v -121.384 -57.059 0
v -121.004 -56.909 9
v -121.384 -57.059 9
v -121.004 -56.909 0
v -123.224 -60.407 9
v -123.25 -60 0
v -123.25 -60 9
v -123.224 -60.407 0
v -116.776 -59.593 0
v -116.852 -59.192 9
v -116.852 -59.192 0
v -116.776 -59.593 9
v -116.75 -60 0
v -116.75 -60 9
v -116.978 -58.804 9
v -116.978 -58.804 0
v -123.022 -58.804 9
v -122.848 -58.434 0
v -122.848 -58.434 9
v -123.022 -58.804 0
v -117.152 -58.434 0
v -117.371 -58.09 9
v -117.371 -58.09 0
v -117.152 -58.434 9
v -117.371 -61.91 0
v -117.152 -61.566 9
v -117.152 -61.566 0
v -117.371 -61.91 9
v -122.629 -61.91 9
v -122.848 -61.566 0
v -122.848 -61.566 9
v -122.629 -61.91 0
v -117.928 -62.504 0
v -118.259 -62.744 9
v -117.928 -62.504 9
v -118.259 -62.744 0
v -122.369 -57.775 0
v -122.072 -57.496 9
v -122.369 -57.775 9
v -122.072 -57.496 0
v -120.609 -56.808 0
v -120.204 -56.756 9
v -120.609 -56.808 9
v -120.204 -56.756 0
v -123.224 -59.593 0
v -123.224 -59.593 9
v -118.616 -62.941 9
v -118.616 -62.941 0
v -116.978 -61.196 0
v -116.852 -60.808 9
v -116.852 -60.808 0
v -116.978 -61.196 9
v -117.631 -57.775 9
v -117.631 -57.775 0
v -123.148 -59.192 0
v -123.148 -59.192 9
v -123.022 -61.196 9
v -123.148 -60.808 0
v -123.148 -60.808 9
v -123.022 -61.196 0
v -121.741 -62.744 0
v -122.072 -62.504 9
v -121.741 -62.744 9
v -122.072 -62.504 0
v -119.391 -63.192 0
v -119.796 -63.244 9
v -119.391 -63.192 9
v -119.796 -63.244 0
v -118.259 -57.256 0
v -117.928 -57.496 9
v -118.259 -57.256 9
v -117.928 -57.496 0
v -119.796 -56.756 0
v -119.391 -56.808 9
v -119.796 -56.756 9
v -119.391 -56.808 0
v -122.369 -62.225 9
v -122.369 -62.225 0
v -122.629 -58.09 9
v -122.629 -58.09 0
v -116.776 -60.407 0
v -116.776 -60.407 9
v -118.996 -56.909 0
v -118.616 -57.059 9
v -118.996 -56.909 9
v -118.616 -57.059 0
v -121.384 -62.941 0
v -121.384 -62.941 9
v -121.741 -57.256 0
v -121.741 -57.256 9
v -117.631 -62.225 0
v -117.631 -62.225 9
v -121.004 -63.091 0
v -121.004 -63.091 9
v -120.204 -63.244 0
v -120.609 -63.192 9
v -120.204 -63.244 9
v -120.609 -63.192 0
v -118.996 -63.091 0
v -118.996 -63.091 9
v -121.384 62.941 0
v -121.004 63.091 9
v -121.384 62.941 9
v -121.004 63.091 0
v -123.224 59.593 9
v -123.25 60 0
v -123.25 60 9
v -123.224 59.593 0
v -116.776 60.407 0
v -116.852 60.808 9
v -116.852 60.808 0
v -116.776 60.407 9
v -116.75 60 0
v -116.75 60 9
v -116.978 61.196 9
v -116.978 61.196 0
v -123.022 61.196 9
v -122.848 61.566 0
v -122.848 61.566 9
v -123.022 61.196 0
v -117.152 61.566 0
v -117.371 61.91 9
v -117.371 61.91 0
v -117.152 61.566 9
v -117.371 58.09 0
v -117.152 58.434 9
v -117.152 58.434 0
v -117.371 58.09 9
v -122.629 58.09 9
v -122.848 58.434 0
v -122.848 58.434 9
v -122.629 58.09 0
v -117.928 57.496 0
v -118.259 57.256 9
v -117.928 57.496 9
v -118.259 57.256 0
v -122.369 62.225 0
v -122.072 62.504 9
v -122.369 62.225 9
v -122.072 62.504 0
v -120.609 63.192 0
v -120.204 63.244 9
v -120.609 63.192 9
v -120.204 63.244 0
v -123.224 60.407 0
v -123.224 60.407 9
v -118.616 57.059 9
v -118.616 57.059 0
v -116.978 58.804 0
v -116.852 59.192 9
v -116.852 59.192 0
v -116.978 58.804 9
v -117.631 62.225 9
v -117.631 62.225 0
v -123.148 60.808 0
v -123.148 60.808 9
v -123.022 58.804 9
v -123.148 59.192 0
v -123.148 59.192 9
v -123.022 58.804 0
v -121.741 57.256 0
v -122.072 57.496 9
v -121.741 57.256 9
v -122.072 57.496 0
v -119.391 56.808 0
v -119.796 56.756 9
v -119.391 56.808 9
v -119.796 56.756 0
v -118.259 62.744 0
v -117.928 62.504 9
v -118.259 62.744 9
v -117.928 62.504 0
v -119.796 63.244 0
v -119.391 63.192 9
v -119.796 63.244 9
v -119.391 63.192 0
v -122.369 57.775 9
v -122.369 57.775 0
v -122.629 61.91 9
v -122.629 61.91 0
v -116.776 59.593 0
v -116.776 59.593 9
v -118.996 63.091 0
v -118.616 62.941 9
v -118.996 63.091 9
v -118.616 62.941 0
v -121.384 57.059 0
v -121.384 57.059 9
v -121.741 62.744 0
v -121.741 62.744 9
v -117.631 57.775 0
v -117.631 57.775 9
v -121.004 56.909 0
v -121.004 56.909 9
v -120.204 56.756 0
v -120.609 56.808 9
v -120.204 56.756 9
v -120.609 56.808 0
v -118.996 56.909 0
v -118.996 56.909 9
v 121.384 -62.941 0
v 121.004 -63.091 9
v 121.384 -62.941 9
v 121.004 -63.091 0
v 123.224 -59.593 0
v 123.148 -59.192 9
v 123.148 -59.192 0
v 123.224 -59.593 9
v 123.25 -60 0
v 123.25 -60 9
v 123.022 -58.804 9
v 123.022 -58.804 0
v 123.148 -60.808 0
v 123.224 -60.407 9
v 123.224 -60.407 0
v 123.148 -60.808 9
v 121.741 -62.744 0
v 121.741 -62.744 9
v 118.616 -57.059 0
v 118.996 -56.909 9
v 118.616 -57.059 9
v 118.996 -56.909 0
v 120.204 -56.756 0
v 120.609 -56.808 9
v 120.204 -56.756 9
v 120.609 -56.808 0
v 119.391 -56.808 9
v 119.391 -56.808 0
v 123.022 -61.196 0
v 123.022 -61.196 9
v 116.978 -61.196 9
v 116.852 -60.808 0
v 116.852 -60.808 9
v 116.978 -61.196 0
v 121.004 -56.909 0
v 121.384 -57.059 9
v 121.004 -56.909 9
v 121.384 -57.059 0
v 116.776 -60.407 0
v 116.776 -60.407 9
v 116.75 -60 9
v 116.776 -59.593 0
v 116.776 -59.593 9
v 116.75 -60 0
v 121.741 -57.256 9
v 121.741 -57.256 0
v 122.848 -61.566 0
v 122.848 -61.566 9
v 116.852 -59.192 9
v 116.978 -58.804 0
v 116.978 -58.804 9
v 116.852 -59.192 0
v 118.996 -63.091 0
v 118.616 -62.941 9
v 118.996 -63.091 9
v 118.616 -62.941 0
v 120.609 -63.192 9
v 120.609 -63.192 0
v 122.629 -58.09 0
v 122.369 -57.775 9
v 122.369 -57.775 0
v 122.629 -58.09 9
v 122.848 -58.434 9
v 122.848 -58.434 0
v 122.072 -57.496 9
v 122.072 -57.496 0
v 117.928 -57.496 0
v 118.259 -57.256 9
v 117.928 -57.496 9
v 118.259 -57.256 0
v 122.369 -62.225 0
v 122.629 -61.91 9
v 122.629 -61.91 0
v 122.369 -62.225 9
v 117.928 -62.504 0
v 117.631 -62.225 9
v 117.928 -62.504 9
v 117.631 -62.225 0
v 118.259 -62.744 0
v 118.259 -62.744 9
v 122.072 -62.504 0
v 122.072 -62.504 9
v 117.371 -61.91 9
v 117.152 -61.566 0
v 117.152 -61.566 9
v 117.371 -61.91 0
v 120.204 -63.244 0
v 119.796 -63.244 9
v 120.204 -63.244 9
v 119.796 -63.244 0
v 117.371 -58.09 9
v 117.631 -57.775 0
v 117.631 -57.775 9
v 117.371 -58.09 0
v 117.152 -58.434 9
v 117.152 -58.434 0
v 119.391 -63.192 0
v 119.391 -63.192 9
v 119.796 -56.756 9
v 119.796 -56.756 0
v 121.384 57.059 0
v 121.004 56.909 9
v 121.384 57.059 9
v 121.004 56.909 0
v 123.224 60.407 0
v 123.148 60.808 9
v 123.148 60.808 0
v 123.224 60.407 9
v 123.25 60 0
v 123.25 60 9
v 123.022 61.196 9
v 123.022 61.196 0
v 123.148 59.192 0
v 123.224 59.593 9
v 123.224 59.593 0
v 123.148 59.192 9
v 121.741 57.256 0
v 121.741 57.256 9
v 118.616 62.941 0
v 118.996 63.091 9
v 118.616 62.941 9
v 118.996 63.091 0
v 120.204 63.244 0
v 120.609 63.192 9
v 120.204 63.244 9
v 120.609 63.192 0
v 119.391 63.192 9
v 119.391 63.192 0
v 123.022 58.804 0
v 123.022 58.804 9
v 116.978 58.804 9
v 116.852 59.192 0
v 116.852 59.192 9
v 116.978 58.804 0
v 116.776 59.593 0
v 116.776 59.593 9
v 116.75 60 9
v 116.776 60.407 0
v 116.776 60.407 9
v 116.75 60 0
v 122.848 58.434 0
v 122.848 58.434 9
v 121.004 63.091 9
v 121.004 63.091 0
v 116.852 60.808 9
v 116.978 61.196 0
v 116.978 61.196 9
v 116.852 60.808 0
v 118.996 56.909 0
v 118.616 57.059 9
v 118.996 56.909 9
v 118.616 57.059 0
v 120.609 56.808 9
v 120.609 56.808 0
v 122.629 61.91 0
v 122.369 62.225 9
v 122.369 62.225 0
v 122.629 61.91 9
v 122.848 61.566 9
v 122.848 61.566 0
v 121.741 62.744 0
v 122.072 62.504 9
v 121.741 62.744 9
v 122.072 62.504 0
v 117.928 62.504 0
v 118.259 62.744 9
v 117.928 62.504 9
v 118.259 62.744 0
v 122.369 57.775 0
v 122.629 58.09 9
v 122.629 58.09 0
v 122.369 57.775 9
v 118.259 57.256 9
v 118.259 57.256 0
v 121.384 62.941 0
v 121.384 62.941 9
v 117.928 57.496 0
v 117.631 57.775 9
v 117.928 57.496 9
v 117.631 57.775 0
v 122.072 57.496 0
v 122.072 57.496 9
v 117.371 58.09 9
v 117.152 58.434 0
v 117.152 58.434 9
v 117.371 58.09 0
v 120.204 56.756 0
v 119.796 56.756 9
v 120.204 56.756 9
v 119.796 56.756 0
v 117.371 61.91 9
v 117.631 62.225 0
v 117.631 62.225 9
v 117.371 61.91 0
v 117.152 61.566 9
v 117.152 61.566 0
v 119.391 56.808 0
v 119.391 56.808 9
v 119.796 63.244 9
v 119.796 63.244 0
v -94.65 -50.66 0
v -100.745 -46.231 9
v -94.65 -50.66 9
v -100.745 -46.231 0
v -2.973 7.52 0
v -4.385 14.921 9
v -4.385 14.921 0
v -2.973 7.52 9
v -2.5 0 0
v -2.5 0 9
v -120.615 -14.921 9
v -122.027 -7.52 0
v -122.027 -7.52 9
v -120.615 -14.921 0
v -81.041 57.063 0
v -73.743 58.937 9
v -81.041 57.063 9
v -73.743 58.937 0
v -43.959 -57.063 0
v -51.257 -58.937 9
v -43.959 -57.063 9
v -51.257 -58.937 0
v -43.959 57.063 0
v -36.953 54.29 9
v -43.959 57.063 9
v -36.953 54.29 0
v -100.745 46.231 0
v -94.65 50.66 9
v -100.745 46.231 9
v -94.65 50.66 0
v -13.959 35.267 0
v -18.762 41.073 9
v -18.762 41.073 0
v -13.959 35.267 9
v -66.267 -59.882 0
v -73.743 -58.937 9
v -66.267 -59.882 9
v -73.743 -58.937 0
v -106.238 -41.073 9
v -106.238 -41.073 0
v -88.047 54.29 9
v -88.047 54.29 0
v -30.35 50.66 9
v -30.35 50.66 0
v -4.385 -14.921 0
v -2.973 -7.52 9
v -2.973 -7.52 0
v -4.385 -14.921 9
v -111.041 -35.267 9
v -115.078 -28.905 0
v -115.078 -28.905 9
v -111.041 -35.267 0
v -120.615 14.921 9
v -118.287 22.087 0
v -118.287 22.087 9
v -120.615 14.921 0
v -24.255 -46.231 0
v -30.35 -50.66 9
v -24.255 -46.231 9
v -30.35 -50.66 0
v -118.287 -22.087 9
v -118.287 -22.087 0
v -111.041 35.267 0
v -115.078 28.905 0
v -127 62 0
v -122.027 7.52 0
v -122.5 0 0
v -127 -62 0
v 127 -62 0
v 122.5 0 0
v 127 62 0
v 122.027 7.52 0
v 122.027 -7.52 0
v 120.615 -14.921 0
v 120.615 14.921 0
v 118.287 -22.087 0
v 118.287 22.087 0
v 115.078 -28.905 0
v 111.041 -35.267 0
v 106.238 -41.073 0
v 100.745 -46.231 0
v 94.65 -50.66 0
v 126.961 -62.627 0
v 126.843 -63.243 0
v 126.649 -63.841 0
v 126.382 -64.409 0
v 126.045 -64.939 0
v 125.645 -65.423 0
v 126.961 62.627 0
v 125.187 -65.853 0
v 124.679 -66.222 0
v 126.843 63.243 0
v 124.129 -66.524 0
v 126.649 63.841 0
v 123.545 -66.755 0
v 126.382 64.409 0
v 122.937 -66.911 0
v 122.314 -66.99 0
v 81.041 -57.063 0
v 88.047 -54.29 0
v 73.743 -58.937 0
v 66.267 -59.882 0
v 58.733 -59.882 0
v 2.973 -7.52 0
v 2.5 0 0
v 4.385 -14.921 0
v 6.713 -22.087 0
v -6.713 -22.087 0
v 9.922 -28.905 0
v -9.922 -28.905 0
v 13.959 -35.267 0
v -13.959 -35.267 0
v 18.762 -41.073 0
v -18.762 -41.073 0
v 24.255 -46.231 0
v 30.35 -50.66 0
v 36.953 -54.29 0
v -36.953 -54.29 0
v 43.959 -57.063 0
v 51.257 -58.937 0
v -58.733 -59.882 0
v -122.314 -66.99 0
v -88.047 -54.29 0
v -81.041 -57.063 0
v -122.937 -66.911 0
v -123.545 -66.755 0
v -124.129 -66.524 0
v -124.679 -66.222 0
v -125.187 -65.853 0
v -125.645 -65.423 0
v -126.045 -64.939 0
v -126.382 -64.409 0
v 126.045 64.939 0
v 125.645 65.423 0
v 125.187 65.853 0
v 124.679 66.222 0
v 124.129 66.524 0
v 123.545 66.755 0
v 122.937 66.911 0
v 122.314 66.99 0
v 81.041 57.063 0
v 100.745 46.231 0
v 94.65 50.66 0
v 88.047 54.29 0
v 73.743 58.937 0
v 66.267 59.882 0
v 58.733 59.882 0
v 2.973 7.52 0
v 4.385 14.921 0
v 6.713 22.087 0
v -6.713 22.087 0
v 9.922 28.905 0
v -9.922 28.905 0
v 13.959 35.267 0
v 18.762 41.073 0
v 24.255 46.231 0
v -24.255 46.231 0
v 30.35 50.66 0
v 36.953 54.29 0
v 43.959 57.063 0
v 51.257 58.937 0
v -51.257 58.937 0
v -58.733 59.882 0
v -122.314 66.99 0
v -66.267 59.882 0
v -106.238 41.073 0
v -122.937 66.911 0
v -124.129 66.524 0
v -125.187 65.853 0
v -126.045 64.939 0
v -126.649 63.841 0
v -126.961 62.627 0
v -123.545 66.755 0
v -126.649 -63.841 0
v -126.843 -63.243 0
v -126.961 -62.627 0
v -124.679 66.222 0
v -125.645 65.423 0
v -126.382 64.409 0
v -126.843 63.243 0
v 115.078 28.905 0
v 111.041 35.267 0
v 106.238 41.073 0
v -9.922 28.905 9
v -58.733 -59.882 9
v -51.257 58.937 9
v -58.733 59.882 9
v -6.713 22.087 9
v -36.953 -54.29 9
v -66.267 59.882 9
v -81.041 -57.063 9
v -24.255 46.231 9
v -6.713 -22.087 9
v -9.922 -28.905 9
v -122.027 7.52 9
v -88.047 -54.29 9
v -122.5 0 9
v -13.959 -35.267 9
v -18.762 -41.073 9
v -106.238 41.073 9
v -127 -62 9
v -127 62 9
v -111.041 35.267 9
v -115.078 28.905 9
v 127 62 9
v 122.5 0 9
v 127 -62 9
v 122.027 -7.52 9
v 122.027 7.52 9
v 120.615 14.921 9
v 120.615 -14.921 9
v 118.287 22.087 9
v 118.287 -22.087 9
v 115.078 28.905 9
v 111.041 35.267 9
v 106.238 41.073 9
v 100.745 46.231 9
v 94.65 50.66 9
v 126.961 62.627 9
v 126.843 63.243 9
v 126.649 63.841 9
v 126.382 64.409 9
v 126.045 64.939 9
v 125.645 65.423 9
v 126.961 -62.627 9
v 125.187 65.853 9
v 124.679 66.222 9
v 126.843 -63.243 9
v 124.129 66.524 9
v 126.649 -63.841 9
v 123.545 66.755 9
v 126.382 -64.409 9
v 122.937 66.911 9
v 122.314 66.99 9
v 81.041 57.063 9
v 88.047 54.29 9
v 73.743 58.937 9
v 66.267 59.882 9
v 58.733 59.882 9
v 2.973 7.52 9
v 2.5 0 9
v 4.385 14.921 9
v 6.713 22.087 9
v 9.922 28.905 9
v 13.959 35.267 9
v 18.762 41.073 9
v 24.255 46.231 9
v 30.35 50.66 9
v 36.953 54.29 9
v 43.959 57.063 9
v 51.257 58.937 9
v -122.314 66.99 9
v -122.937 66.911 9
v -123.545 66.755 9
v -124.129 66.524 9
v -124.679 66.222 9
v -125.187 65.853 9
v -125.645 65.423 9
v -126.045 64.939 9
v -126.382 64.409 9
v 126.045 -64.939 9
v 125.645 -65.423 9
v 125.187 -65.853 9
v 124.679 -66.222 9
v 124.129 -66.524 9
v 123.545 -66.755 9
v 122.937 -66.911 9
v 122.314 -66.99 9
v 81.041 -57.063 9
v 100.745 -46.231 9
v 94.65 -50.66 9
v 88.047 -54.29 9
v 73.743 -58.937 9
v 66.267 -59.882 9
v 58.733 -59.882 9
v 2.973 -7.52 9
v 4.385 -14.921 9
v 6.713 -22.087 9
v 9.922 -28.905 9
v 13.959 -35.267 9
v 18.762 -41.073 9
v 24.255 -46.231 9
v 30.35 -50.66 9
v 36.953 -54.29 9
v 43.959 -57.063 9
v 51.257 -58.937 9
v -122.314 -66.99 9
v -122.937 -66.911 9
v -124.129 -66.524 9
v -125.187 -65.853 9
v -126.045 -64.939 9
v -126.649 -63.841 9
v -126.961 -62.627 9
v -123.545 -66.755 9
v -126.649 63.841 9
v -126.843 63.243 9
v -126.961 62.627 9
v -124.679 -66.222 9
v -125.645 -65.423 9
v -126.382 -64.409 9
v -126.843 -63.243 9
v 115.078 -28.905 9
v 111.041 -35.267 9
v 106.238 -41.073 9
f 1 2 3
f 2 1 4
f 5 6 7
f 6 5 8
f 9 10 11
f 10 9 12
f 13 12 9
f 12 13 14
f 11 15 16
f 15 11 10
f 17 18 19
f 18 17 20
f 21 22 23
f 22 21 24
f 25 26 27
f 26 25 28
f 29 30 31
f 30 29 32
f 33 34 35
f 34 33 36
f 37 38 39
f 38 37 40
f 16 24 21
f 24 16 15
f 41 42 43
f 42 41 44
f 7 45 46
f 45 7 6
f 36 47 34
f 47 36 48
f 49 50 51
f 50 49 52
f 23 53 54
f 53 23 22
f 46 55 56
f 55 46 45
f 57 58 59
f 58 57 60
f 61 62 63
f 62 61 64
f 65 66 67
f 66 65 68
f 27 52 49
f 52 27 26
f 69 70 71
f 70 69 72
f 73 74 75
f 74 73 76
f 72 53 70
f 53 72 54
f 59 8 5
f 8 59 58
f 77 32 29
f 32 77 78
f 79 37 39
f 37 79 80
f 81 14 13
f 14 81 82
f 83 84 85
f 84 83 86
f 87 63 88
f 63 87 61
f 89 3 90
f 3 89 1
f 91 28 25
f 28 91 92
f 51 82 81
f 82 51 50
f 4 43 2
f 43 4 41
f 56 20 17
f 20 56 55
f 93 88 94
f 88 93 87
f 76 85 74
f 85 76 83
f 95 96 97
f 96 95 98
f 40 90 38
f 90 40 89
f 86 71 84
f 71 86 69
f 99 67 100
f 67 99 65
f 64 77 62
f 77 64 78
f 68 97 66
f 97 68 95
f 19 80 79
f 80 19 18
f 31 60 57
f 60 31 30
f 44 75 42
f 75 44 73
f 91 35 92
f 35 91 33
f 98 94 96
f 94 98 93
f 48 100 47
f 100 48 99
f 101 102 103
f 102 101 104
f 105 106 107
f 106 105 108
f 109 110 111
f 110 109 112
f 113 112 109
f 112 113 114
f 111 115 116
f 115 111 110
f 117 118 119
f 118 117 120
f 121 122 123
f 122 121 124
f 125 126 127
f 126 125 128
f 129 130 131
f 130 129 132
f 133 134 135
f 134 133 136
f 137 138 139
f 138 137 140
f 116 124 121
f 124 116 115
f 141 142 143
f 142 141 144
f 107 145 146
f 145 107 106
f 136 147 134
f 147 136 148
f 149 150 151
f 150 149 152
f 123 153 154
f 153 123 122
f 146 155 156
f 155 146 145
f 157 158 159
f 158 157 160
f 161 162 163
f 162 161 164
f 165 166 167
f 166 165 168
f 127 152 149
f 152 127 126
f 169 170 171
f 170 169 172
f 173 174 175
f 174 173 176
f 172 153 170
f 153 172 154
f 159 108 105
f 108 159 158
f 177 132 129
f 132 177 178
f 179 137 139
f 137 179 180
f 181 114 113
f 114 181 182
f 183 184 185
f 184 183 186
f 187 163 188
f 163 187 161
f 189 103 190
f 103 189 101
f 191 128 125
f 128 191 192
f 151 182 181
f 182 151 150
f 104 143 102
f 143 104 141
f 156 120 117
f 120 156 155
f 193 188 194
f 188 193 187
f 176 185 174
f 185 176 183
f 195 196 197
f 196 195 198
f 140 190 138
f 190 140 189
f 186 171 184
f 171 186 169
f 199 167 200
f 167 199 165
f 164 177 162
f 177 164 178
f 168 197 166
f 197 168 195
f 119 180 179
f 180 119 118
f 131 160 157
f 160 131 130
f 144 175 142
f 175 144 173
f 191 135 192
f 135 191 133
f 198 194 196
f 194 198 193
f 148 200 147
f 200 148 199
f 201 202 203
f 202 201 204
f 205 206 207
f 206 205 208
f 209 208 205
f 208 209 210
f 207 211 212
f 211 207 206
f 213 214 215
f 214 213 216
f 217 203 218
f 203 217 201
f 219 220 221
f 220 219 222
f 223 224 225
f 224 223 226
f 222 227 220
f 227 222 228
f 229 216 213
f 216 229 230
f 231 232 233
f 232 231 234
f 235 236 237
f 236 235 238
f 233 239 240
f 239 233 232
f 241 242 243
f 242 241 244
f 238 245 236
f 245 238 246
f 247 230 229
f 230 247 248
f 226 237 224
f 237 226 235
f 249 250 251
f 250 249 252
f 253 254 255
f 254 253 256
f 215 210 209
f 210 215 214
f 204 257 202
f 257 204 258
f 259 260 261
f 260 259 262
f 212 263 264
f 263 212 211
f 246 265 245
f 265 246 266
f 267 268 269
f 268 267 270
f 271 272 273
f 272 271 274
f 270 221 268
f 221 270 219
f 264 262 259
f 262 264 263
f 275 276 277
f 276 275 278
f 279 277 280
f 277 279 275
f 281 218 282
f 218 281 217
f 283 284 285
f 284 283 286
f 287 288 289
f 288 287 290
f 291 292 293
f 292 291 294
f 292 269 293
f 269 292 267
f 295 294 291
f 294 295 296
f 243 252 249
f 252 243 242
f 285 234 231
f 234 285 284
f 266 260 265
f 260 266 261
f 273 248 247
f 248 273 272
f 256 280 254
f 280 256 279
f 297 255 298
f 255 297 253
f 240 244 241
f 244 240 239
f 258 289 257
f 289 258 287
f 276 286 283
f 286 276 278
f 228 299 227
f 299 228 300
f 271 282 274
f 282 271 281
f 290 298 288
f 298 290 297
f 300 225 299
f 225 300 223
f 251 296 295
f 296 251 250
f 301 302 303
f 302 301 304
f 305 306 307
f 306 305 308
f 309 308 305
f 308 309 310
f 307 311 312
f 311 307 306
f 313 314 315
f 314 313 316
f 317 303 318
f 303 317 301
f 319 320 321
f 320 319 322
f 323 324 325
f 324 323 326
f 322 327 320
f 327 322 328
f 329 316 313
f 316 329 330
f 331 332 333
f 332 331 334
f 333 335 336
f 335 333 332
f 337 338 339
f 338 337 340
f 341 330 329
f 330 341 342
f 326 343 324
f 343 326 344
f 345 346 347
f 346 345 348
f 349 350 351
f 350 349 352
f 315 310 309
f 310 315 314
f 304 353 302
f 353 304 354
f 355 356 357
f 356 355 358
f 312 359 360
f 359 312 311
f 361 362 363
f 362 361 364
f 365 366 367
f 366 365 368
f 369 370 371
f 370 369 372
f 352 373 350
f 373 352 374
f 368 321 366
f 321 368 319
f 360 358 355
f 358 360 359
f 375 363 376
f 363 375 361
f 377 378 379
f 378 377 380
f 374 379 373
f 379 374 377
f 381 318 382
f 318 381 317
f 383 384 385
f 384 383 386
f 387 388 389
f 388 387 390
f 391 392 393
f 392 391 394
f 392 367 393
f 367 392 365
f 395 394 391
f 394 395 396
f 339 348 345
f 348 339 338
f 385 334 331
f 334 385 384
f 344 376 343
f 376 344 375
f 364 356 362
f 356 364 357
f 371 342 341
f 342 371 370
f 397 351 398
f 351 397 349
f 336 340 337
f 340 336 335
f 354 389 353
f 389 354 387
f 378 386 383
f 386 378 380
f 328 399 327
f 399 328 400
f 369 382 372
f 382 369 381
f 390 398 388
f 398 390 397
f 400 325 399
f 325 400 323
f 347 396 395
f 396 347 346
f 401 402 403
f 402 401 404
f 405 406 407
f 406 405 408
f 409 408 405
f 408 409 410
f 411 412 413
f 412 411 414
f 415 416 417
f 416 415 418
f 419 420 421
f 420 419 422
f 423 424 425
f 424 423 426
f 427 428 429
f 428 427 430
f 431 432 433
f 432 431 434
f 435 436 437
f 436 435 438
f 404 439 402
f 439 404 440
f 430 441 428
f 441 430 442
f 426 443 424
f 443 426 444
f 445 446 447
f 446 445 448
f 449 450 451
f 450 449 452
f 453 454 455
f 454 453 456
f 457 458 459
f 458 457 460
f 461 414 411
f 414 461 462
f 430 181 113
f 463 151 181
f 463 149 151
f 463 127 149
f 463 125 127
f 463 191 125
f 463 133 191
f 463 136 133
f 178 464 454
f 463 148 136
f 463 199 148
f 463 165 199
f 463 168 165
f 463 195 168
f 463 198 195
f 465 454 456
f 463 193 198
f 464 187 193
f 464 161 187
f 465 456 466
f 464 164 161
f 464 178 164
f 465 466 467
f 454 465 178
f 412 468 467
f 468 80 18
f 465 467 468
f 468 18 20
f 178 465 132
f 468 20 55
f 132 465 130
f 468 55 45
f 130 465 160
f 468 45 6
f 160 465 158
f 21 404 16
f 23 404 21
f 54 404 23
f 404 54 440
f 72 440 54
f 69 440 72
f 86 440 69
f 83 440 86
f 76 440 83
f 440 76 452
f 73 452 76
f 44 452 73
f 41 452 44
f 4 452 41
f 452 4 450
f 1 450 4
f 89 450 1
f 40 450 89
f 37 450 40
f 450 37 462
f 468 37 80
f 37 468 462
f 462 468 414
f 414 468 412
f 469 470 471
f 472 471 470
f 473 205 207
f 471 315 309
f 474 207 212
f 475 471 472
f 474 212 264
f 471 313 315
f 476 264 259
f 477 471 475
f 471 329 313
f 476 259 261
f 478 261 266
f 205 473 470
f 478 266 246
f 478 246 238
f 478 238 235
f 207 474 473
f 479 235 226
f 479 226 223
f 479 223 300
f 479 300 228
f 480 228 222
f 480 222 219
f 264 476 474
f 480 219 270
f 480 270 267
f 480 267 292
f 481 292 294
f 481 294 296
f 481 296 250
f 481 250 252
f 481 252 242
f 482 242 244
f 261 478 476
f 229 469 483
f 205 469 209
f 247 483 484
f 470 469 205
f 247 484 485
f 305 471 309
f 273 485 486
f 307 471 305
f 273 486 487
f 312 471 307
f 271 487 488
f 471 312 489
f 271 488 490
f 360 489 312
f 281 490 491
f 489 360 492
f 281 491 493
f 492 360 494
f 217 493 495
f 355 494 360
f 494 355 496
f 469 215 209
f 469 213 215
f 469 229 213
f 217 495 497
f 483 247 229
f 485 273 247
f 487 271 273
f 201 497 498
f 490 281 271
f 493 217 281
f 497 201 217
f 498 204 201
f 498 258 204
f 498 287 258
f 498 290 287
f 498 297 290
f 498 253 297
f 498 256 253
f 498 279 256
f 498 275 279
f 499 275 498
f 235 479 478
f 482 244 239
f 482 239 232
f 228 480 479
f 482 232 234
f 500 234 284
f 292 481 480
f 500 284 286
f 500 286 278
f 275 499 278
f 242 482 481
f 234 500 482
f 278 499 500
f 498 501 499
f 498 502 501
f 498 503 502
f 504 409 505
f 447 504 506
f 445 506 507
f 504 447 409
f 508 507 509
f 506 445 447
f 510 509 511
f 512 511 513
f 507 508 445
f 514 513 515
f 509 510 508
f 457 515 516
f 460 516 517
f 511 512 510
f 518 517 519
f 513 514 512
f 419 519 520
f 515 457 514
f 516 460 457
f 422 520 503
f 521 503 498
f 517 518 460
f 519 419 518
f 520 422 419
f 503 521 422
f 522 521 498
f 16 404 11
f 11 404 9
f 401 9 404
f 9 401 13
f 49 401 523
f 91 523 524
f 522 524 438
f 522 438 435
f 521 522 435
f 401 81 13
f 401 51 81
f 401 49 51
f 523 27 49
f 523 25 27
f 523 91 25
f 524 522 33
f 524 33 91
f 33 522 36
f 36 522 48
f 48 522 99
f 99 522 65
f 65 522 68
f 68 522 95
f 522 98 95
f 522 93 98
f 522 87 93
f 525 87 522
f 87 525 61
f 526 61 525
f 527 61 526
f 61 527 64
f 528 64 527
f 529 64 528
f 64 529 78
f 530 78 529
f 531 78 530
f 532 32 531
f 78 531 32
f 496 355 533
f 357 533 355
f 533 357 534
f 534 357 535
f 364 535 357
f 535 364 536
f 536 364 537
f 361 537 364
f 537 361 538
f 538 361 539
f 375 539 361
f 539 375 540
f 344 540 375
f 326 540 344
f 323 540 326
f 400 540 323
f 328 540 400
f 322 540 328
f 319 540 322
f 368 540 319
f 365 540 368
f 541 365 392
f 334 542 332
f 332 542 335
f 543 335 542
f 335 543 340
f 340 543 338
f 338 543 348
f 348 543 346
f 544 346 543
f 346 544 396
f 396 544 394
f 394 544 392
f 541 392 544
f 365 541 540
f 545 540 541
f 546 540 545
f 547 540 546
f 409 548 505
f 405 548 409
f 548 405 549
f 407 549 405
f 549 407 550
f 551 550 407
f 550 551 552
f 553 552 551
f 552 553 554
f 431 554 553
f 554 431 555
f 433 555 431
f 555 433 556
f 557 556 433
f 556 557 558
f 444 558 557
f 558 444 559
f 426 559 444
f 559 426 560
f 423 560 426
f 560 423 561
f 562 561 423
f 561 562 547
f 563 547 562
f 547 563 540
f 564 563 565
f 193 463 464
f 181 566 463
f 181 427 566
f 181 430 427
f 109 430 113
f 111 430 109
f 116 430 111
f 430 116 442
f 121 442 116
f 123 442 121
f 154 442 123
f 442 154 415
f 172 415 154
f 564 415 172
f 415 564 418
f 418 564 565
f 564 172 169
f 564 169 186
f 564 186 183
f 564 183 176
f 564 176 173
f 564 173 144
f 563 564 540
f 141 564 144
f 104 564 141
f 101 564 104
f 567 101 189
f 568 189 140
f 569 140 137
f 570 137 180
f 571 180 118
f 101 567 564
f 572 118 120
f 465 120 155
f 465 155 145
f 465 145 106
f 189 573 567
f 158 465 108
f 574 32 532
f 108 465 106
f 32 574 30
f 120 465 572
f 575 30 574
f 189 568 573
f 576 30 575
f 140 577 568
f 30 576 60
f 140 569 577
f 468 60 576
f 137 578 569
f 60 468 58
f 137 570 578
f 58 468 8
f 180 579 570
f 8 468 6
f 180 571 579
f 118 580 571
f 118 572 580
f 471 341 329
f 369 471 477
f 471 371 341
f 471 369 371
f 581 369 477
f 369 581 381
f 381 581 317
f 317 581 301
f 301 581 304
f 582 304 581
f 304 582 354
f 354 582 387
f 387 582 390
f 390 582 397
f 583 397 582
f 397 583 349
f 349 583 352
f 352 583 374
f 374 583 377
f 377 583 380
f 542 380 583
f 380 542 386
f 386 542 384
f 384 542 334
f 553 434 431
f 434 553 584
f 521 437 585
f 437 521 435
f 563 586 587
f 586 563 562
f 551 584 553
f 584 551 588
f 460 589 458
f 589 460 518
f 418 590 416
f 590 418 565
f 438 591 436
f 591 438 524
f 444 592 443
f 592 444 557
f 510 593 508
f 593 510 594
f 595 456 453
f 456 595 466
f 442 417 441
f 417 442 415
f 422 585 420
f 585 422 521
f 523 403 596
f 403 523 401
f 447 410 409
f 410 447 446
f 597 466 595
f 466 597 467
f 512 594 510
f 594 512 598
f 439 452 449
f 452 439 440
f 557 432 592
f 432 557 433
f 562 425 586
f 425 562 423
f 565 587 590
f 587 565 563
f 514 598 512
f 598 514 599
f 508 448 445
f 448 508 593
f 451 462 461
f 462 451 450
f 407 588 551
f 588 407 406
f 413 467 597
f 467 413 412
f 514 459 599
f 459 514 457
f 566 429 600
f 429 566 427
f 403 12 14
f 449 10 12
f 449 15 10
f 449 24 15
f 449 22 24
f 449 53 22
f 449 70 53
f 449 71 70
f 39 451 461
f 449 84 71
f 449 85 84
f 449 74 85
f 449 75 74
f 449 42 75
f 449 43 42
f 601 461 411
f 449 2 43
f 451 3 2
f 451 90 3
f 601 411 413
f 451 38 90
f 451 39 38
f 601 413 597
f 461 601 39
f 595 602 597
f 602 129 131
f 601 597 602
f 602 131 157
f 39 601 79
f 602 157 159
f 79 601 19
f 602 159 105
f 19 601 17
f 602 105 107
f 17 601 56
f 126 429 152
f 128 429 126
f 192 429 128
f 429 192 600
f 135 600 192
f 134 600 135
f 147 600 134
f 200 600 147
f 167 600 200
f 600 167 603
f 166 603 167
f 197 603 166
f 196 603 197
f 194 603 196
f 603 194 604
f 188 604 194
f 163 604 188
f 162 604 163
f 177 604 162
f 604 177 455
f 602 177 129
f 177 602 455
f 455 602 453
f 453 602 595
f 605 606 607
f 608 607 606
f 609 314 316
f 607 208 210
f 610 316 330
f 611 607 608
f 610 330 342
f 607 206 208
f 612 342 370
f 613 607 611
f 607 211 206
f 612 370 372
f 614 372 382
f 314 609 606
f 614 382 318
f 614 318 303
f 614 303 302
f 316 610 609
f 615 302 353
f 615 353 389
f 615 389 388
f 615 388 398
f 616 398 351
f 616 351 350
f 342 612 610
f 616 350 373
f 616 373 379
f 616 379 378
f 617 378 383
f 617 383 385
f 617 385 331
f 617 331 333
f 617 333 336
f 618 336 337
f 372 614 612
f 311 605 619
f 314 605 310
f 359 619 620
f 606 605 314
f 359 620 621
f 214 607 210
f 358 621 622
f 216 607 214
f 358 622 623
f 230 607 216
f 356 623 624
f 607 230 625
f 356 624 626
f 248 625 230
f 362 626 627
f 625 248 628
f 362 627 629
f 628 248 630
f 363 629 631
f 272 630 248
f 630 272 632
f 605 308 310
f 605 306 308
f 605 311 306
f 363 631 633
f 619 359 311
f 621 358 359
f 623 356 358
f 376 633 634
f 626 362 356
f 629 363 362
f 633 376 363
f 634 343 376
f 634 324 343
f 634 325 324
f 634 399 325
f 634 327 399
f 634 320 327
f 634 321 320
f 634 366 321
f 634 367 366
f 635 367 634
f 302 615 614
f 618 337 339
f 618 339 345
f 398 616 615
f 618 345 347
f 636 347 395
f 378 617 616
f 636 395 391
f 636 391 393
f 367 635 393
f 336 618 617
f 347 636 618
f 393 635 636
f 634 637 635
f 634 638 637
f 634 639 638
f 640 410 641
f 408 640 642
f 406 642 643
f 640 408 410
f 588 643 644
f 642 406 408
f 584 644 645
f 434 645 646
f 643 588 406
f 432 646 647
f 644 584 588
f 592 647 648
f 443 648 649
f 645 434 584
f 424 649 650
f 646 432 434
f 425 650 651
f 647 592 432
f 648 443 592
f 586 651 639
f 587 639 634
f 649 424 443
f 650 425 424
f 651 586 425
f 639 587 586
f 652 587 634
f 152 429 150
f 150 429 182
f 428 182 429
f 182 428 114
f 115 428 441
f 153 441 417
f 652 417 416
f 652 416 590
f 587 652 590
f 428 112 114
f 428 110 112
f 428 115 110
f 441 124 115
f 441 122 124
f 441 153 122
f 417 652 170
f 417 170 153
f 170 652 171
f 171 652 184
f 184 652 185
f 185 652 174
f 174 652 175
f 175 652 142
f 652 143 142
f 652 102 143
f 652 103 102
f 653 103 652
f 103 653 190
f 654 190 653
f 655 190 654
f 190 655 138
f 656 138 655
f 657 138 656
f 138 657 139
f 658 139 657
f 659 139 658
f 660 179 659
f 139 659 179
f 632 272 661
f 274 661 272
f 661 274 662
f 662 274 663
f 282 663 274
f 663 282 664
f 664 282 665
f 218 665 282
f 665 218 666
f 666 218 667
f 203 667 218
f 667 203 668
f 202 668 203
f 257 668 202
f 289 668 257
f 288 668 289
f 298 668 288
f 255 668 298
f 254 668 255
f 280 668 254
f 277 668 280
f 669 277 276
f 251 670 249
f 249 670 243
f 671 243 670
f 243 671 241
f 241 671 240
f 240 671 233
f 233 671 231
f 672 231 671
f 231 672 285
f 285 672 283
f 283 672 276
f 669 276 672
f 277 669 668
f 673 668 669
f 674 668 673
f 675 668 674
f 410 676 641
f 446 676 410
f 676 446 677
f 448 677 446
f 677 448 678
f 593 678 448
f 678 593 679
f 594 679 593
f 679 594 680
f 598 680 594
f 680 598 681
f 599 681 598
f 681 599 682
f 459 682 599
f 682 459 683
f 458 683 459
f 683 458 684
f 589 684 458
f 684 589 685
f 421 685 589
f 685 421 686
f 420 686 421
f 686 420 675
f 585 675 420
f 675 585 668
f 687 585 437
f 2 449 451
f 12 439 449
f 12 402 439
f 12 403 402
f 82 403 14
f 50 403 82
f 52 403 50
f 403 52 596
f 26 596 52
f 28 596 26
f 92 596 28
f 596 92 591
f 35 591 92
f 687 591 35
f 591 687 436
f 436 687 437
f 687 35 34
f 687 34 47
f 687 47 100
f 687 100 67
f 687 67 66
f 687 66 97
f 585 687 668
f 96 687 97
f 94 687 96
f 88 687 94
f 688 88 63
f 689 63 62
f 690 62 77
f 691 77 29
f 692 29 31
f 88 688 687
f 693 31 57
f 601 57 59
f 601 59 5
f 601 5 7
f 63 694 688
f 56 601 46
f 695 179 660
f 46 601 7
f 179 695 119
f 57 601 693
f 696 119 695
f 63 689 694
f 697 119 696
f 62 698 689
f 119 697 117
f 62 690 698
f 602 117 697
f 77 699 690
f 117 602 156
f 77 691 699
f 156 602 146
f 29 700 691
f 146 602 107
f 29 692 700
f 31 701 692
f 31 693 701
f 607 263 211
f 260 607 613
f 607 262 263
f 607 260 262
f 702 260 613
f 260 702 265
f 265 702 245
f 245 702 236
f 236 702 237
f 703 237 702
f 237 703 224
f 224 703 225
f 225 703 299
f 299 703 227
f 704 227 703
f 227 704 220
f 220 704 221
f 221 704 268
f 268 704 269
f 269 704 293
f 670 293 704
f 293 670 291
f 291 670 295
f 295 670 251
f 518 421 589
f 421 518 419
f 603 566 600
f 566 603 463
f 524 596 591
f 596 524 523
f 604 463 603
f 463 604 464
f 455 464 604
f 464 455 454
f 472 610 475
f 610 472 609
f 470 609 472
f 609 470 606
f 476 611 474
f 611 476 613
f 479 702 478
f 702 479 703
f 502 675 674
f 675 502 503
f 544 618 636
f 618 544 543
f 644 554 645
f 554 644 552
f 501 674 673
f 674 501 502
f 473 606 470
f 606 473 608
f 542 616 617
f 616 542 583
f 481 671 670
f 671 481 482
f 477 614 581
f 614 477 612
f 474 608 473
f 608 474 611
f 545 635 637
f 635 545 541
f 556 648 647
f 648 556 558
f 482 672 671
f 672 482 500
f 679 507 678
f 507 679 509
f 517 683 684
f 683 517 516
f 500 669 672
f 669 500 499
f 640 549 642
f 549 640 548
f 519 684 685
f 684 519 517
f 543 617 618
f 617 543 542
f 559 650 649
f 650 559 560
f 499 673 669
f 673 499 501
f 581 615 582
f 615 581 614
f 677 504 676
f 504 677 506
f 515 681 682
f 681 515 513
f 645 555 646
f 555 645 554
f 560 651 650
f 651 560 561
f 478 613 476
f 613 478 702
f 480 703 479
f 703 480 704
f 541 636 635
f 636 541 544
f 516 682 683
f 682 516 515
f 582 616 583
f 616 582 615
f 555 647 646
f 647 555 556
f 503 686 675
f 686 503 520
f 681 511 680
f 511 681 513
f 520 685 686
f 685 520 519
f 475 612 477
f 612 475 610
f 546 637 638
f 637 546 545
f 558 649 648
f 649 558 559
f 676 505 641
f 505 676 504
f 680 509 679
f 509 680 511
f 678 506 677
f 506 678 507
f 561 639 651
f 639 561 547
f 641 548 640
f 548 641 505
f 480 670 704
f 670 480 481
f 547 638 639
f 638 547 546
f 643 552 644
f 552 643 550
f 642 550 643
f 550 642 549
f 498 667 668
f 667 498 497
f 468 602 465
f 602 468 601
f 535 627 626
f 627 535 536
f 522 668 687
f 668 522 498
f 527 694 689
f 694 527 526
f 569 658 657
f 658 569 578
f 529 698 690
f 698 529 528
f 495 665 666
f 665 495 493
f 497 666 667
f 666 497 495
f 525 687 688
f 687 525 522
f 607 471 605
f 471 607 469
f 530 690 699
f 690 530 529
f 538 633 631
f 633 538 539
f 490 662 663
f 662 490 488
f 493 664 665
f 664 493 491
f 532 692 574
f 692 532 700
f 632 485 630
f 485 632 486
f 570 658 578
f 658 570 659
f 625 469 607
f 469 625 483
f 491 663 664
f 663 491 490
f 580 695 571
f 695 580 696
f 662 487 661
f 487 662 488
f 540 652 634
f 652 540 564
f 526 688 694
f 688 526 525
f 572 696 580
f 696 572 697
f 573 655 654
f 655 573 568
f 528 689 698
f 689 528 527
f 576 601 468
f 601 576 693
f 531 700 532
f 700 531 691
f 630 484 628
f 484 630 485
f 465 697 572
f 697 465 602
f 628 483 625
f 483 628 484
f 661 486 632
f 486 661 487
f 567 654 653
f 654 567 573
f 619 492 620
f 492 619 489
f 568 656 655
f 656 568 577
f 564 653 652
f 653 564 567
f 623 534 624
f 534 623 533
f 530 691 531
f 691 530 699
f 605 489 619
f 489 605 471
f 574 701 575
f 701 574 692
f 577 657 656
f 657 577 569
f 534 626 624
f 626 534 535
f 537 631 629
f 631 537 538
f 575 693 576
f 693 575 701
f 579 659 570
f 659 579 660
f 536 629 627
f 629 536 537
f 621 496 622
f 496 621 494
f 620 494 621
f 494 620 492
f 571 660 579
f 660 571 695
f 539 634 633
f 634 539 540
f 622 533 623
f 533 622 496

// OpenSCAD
$fn = 50;


difference() {
	union() {
		hull() {
			translate(v = [-122.0000000000, 62.0000000000, 0]) {
				cylinder(h = 9, r = 5);
			}
			translate(v = [122.0000000000, 62.0000000000, 0]) {
				cylinder(h = 9, r = 5);
			}
			translate(v = [-122.0000000000, -62.0000000000, 0]) {
				cylinder(h = 9, r = 5);
			}
			translate(v = [122.0000000000, -62.0000000000, 0]) {
				cylinder(h = 9, r = 5);
			}
		}
	}
	union() {
		#translate(v = [-120.0000000000, -60.0000000000, -100.0000000000]) {
			cylinder(h = 200, r = 3.2500000000);
		}
		#translate(v = [-120.0000000000, 60.0000000000, -100.0000000000]) {
			cylinder(h = 200, r = 3.2500000000);
		}
		#translate(v = [120.0000000000, -60.0000000000, -100.0000000000]) {
			cylinder(h = 200, r = 3.2500000000);
		}
		#translate(v = [120.0000000000, 60.0000000000, -100.0000000000]) {
			cylinder(h = 200, r = 3.2500000000);
		}
		#translate(v = [-62.5000000000, 0, 0]) {
			cylinder(h = 9, r = 60.0000000000);
		}
		#translate(v = [62.5000000000, 0, 0]) {
			cylinder(h = 9, r = 60.0000000000);
		}
	}
}
